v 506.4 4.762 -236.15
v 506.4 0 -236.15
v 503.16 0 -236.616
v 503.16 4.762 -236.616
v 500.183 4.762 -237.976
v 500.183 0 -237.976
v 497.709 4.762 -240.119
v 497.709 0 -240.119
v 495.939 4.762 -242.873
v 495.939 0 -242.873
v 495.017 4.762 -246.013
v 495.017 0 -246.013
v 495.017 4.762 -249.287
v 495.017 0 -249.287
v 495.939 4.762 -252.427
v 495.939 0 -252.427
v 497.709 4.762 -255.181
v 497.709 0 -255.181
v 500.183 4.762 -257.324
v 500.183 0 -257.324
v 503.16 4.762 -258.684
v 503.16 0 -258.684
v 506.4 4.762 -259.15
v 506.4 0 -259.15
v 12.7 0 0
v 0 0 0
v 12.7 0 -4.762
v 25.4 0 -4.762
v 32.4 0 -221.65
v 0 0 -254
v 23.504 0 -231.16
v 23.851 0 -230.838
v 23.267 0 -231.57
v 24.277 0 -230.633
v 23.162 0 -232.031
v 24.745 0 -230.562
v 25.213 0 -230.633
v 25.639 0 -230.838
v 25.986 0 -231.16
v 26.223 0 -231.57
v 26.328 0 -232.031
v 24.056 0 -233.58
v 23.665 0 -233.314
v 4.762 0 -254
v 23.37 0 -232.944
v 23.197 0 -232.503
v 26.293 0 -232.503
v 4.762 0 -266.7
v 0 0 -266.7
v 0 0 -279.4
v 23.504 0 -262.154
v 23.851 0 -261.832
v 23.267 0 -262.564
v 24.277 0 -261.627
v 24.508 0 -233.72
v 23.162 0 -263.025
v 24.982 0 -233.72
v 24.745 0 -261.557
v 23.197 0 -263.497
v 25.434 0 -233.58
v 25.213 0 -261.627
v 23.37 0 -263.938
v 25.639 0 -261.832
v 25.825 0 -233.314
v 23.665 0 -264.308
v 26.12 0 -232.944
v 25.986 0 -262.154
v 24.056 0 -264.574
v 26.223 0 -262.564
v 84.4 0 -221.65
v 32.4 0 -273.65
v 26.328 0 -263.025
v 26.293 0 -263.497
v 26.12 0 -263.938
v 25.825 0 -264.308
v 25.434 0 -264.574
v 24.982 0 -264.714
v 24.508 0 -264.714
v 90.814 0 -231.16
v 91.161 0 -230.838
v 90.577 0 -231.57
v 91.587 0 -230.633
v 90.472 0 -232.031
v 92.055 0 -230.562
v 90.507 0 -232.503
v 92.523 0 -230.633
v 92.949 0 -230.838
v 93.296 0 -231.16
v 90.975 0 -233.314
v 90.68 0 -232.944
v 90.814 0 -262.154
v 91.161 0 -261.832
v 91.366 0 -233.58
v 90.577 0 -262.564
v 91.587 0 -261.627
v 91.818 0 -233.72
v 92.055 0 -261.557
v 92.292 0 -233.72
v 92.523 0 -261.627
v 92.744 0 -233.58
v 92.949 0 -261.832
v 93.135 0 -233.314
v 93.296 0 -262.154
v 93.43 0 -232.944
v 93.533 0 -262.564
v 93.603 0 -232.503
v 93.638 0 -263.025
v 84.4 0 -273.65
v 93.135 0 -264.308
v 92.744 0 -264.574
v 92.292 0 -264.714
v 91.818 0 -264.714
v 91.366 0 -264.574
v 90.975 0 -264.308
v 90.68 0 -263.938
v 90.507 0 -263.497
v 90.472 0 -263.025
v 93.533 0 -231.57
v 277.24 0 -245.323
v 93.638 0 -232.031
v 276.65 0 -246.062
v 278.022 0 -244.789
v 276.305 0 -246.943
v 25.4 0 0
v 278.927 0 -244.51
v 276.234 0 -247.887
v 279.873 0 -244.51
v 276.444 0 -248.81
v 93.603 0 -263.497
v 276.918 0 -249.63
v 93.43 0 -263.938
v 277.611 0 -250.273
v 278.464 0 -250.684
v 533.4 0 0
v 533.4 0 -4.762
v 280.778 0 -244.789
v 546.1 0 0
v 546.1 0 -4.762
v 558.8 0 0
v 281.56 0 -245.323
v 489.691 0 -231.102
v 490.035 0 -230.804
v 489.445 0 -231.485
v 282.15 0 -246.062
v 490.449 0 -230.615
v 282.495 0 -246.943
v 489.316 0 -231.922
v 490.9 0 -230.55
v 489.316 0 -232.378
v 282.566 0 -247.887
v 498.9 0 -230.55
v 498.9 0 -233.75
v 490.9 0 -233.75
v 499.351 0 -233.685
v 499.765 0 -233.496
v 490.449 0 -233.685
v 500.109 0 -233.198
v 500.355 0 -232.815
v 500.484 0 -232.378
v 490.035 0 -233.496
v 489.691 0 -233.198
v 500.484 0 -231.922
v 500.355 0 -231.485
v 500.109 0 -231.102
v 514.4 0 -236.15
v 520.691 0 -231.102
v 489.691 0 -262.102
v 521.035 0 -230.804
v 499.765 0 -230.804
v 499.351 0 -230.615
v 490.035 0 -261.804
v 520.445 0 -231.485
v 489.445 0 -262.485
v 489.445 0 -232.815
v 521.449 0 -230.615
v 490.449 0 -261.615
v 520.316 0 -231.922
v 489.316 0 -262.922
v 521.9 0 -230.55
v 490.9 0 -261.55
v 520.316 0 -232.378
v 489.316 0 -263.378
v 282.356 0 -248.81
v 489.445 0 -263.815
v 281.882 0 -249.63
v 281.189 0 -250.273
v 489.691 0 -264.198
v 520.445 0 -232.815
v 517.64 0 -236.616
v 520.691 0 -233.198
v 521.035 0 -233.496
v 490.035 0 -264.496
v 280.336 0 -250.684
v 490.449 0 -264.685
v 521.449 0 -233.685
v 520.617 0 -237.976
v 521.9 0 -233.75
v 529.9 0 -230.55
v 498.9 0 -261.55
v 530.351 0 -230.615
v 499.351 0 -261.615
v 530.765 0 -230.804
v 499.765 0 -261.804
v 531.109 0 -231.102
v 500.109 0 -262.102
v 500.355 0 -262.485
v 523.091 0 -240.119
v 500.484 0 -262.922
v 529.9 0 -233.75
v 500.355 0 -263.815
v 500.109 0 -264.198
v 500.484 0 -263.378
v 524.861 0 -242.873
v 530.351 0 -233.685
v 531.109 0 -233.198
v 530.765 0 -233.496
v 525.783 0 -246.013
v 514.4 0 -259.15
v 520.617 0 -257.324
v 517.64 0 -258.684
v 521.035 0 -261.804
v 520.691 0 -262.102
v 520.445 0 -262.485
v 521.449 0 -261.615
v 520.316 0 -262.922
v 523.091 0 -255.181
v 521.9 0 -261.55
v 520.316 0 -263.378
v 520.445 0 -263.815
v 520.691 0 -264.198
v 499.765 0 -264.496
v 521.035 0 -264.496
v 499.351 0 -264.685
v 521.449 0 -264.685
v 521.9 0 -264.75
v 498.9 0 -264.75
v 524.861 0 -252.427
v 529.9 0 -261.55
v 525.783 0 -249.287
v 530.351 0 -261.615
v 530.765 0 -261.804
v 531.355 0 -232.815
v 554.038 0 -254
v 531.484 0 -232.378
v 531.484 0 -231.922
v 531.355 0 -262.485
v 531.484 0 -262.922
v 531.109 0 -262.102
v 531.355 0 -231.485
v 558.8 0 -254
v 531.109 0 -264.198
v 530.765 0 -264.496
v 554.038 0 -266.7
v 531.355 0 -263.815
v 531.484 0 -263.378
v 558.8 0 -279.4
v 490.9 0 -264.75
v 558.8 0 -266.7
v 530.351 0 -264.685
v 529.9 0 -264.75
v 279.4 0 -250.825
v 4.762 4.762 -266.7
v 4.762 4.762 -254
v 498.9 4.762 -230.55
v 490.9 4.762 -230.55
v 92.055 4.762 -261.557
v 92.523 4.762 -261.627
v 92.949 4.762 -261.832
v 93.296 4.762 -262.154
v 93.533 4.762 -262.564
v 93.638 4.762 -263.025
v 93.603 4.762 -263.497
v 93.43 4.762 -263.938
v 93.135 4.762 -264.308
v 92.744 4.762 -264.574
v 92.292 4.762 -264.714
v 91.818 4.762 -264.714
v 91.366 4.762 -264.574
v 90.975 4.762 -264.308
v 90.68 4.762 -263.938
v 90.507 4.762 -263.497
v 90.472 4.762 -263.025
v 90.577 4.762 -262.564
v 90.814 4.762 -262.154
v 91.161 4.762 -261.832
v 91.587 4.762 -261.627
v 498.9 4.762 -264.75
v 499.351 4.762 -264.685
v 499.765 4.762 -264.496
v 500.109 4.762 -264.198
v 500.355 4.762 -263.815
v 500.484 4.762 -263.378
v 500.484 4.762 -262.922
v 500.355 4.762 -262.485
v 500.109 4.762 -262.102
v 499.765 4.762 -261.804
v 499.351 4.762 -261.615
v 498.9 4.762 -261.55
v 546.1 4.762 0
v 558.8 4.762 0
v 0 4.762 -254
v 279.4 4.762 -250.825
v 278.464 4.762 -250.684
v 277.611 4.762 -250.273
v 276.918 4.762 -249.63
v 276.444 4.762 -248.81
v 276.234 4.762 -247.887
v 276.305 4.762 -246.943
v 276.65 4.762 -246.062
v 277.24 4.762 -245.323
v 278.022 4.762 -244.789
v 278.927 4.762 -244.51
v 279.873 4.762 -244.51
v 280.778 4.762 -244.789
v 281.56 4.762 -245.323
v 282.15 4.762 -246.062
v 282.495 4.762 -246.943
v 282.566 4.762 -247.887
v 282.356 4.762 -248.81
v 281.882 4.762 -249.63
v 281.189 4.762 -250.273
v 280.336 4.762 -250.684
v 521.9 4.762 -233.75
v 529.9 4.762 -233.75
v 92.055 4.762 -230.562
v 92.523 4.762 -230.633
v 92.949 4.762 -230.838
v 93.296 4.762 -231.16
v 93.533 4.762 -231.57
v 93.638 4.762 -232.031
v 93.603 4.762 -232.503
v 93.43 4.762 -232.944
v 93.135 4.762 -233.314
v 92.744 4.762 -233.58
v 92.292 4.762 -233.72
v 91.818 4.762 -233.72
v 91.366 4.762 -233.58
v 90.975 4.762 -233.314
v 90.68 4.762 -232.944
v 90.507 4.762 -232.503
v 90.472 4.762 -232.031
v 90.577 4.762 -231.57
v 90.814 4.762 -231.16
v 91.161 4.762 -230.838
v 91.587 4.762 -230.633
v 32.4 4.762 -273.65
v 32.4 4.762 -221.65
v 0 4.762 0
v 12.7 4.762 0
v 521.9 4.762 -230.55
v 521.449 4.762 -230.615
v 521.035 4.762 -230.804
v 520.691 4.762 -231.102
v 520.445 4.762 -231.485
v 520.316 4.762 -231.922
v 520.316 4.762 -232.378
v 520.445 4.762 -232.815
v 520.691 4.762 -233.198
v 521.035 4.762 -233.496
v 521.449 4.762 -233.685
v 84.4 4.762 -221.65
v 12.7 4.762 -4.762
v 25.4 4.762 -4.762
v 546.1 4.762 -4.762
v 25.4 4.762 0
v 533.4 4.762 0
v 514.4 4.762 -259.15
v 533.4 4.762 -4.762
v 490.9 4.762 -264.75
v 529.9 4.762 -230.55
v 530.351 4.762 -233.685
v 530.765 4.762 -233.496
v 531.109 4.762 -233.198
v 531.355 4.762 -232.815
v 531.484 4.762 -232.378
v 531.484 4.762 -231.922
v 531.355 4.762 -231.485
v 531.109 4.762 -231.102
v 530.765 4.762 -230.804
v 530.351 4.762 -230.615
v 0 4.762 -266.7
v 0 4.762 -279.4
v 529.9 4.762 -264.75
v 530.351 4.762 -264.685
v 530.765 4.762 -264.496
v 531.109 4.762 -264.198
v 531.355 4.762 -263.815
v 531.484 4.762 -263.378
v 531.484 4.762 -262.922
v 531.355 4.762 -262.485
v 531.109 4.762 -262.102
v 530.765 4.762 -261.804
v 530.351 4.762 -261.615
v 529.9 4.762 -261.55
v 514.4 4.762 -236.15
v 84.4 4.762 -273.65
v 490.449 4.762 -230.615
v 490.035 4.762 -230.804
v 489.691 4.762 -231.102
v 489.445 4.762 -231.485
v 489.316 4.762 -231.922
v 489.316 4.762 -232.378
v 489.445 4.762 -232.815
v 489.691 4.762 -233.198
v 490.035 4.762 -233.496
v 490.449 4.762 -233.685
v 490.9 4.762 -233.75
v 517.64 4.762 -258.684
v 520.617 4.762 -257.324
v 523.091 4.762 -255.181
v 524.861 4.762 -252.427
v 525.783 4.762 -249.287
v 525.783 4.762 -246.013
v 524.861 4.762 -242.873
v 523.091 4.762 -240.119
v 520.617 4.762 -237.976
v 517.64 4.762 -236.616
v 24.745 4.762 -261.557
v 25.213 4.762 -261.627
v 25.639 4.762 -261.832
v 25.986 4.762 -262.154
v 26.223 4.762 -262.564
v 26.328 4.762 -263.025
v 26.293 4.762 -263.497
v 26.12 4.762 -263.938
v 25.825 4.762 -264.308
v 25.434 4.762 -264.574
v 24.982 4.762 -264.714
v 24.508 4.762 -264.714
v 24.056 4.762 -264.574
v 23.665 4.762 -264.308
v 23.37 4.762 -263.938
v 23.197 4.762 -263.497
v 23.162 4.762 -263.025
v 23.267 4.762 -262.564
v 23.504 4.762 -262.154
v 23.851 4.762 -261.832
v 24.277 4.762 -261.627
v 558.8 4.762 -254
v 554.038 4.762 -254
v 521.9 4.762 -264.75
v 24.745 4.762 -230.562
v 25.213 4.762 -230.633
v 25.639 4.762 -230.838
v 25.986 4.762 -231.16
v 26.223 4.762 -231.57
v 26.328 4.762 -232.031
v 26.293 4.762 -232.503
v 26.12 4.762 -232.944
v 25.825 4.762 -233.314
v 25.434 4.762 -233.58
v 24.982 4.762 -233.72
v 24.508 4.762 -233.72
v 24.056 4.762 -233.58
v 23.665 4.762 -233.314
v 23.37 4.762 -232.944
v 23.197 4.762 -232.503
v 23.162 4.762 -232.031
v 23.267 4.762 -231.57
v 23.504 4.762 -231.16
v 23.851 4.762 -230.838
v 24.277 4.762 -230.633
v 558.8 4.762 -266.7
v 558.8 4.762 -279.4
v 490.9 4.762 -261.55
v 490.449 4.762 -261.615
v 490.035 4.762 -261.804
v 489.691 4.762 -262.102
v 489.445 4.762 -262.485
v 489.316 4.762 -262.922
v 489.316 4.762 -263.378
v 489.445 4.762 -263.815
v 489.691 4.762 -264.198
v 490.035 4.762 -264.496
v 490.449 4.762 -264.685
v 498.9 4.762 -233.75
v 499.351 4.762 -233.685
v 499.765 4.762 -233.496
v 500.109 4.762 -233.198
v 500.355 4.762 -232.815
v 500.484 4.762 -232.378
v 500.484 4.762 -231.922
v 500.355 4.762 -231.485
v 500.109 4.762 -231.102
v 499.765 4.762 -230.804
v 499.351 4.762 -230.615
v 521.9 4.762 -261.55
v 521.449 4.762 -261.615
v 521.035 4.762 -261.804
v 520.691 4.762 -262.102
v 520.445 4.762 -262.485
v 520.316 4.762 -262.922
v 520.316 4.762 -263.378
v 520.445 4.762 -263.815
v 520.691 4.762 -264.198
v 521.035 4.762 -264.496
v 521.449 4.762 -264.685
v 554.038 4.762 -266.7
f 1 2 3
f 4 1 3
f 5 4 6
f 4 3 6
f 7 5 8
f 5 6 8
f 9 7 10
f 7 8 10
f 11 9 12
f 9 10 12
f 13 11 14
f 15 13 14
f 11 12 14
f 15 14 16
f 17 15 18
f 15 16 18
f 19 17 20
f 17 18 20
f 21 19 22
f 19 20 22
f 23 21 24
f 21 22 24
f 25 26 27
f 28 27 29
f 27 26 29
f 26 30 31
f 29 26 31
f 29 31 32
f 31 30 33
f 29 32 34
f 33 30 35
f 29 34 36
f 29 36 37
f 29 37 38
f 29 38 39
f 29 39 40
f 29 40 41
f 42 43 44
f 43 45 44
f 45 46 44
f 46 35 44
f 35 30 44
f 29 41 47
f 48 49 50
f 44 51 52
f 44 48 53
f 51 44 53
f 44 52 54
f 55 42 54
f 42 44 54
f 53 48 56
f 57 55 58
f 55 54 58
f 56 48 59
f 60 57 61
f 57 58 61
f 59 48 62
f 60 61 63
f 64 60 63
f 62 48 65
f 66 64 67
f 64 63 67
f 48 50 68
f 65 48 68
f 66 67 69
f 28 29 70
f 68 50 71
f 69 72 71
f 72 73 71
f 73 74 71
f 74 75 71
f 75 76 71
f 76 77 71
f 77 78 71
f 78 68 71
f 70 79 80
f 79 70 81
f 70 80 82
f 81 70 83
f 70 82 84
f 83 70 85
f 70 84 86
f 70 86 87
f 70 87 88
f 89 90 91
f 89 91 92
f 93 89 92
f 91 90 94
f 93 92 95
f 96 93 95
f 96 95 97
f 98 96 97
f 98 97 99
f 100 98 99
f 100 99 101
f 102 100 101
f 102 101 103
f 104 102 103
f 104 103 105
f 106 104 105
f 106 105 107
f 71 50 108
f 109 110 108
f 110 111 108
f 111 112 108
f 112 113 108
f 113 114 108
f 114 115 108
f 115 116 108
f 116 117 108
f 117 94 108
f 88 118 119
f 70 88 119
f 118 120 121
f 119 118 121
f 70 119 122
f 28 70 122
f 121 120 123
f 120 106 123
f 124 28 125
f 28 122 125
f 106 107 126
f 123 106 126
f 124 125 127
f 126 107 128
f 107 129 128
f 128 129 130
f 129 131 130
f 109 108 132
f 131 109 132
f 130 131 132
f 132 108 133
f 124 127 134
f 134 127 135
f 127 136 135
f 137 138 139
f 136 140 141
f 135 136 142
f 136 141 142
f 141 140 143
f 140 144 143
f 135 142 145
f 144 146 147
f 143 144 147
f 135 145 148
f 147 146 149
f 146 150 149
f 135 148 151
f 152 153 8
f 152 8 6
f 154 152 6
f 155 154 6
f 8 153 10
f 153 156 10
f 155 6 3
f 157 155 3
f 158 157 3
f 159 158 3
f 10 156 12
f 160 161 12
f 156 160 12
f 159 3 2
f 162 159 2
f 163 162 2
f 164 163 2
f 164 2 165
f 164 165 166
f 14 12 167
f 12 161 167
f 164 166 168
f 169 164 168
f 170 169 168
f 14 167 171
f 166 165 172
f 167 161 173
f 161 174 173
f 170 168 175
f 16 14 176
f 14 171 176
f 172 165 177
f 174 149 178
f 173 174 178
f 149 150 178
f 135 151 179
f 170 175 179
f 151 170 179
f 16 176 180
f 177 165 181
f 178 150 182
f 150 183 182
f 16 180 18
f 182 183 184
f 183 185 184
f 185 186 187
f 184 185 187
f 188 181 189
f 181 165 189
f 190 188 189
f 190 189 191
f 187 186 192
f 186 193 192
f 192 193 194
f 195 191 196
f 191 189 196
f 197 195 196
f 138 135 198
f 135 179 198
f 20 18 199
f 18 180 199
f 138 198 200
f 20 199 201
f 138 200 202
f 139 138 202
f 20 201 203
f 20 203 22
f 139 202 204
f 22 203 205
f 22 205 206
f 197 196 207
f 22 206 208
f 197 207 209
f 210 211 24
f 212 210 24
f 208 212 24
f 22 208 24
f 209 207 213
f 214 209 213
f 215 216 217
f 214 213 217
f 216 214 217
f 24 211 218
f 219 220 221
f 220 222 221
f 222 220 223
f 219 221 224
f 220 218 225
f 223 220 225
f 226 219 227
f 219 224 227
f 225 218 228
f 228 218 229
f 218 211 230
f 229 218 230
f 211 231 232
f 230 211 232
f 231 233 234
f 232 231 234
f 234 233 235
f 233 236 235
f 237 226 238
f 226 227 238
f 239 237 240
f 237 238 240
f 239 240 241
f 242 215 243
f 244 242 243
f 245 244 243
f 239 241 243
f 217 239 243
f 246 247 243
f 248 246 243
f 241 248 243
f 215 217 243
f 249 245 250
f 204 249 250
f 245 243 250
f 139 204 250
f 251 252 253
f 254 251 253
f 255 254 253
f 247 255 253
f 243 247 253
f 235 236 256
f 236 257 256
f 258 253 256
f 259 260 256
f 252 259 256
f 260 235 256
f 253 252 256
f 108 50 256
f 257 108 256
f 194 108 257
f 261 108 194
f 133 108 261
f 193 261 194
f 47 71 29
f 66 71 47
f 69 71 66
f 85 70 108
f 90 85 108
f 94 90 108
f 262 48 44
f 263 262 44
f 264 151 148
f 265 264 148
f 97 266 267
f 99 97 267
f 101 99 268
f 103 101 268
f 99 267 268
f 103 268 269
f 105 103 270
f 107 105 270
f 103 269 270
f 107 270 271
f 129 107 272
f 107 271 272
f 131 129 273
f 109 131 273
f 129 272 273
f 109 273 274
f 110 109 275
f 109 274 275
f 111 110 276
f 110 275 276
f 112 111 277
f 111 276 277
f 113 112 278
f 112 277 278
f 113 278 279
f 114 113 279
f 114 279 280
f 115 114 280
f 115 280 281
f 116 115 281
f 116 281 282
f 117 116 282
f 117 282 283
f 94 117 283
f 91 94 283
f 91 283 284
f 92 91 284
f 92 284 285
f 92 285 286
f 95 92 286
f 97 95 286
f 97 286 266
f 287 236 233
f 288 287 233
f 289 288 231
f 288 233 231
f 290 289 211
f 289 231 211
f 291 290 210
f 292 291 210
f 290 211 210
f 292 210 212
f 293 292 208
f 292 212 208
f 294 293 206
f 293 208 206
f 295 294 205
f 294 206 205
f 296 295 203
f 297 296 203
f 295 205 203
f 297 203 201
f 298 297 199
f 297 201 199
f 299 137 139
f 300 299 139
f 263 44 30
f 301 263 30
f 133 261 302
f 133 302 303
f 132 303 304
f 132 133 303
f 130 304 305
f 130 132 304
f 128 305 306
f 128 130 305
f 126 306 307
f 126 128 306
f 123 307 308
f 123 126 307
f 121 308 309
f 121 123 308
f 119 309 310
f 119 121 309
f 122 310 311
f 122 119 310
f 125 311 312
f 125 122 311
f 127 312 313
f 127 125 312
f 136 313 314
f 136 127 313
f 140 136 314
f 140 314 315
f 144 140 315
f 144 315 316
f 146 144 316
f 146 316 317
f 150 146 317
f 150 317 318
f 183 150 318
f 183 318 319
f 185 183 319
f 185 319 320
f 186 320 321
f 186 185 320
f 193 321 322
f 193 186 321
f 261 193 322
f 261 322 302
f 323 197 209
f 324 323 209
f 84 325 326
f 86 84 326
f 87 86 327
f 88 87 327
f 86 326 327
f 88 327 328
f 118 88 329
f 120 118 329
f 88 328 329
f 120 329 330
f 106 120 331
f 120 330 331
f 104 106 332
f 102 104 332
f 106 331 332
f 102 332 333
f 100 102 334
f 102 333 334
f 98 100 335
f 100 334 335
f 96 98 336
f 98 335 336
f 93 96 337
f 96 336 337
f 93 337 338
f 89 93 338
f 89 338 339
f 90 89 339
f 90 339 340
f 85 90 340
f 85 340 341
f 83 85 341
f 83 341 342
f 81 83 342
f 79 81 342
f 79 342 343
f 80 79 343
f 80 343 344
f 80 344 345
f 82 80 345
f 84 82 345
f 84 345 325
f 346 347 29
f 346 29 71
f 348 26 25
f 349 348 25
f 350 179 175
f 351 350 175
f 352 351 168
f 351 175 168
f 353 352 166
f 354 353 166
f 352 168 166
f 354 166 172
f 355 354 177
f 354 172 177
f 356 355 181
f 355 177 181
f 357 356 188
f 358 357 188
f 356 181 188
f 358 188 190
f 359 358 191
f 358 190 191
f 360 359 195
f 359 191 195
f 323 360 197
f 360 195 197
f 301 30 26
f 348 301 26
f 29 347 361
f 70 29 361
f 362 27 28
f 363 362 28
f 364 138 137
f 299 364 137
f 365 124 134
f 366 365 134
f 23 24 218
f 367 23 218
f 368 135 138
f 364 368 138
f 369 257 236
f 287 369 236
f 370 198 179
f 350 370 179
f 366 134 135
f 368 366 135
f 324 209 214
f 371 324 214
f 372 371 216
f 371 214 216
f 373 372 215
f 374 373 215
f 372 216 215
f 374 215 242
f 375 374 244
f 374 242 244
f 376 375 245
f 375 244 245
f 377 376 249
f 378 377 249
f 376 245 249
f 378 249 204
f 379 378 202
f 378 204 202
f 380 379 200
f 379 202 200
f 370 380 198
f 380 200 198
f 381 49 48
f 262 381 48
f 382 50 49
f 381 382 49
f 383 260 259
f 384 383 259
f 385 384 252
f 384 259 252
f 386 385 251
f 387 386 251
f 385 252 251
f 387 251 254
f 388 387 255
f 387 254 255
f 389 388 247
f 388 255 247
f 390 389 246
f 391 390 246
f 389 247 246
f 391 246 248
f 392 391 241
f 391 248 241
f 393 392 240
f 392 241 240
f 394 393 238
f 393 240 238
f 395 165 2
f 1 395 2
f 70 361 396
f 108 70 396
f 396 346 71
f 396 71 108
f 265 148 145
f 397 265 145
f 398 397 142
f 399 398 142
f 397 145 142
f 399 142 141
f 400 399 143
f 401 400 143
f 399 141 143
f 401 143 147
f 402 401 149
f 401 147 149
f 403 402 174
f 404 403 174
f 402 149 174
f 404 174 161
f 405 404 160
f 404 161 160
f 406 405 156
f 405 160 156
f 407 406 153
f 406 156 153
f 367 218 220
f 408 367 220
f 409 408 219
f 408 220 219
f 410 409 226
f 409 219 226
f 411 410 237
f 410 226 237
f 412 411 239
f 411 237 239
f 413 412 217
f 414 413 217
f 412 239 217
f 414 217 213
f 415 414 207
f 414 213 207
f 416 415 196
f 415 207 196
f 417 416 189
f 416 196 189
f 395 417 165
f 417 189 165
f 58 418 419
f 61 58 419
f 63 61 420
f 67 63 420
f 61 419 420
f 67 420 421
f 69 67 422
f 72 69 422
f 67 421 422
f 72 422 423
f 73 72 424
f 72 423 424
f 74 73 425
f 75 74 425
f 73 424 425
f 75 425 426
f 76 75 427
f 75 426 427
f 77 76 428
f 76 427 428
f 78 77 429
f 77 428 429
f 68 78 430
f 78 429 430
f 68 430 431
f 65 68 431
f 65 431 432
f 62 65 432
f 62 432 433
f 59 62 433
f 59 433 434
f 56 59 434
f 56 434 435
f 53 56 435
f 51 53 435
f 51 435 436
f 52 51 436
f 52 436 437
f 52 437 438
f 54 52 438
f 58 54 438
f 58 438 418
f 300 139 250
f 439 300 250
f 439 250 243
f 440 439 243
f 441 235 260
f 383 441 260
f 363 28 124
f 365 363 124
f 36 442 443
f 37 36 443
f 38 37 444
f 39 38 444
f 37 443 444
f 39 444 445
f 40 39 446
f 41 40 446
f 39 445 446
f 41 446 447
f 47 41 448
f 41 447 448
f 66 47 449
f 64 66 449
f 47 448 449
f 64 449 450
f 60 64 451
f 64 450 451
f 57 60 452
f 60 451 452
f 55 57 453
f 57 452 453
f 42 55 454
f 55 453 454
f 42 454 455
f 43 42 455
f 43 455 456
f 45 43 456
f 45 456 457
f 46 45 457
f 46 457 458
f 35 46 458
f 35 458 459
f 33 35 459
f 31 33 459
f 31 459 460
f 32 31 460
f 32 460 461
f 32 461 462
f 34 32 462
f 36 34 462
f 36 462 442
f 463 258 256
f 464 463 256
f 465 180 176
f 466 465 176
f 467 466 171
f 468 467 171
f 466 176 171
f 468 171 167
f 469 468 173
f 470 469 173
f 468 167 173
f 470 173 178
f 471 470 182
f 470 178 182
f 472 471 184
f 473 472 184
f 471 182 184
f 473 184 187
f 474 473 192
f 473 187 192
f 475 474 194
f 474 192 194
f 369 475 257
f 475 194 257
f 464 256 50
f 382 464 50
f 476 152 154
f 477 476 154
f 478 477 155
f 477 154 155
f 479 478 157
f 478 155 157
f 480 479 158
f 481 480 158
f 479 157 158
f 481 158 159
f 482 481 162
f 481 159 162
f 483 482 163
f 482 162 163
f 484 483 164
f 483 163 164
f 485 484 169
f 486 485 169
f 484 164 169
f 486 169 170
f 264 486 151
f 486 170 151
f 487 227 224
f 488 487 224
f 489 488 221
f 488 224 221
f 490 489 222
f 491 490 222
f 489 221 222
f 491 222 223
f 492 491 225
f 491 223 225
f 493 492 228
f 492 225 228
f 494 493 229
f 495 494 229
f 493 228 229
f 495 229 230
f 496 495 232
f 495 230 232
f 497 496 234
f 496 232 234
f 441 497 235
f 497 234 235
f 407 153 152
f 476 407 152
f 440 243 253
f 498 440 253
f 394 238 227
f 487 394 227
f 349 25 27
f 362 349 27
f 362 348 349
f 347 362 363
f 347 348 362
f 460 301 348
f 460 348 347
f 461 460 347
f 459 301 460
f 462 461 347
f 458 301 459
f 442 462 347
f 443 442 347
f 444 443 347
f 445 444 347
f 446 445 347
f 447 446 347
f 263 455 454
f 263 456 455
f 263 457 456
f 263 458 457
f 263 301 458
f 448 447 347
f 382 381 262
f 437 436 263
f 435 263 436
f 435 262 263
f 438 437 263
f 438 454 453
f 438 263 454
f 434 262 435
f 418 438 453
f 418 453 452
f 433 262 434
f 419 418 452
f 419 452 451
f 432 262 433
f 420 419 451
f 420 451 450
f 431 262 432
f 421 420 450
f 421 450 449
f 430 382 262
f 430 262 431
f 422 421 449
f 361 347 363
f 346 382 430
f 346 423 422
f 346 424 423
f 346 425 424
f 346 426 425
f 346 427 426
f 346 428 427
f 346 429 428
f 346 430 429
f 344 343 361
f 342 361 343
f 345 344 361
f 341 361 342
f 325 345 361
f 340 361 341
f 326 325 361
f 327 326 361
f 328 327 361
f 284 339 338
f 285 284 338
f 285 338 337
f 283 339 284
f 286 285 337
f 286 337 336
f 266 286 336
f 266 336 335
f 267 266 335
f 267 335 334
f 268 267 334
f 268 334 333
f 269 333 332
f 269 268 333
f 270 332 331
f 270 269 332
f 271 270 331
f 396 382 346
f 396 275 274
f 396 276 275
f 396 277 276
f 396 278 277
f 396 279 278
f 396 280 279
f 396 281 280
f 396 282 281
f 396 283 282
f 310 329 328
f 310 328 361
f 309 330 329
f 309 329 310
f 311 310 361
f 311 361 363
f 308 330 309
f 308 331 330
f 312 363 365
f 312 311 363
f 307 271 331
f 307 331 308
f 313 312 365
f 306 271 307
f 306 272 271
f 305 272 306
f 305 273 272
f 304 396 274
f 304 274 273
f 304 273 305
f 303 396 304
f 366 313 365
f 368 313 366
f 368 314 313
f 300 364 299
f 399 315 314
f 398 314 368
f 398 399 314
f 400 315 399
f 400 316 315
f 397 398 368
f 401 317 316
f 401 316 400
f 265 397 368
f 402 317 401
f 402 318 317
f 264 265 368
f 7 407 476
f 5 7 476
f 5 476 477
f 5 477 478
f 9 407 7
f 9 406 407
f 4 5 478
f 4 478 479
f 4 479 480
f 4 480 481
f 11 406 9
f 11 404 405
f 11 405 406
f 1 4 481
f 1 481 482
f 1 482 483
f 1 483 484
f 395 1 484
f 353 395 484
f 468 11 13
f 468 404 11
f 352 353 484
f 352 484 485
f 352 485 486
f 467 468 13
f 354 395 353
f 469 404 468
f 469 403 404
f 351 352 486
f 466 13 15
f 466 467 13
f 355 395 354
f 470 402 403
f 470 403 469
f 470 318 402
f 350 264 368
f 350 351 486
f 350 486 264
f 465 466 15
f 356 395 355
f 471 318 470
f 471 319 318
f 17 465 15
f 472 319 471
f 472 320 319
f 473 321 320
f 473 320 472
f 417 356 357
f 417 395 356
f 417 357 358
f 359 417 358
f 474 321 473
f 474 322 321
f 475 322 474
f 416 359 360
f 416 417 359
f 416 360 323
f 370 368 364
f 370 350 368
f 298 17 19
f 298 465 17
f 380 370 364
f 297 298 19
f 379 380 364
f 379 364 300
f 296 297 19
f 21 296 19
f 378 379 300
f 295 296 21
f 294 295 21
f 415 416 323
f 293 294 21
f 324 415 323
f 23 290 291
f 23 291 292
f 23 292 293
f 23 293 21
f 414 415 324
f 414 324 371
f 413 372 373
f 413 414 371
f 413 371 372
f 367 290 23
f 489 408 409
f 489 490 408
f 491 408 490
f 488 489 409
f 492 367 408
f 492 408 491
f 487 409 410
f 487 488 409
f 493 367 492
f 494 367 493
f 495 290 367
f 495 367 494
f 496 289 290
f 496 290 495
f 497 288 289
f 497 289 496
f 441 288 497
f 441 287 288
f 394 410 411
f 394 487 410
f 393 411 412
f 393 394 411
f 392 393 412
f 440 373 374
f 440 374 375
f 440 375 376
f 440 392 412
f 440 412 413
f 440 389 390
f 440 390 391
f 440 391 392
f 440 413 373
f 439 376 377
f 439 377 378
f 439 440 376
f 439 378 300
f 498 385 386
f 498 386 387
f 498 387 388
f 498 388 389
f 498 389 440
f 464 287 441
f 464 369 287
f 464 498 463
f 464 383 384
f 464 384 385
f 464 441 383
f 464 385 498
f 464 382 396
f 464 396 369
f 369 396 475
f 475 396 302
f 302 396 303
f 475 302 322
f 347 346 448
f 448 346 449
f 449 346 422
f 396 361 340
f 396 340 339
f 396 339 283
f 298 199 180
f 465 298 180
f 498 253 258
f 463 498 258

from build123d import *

# Parameters (mm, degrees)
SKETCH1_R           = 3.175
BOSS_EXTRUDE1_DEPTH = 4.7625
SKETCH5_R           = 1.5875
SKETCH5_W           = 51.999999886
SKETCH5_H           = 51.999999886
CUT_EXTRUDE2_DEPTH  = 625.775544821


with BuildPart() as part:
    # Sketch1 → Boss-Extrude1 (new body)
    with BuildSketch(Plane(origin=(0, 0, 0), x_dir=(1, 0, 0), z_dir=(0, 1, 0))):
        Polygon((0, 0), (12.7, 0), (12.7, 4.7625), (25.4, 4.7625), (25.4, 0), (533.4, 0), (533.4, 4.7625), (546.1, 4.7625), (546.1, 0), (558.8, 0), (558.8, 254), (554.0375, 254), (554.0375, 266.7), (558.8, 266.7), (558.8, 279.4), (0, 279.4), (0, 266.7), (4.7625, 266.7), (4.7625, 254), (0, 254), align=None)
        with Locations(Location((279.4, 247.65, 0), (0, 0, 90))):
            Circle(SKETCH1_R, mode=Mode.SUBTRACT)
        with BuildLine():
            Line((38.9, 264.75), (46.9, 264.75))
            ThreePointArc((46.9, 264.75), (48.5, 263.15), (46.9, 261.55))
            Line((46.9, 261.55), (38.9, 261.55))
            ThreePointArc((38.9, 261.55), (37.3, 263.15), (38.9, 264.75))
        make_face(mode=Mode.SUBTRACT)
        with BuildLine():
            Line((69.9, 264.75), (77.9, 264.75))
            ThreePointArc((77.9, 264.75), (79.5, 263.15), (77.9, 261.55))
            Line((77.9, 261.55), (69.9, 261.55))
            ThreePointArc((69.9, 261.55), (68.3, 263.15), (69.9, 264.75))
        make_face(mode=Mode.SUBTRACT)
        with BuildLine():
            Line((38.9, 233.75), (46.9, 233.75))
            ThreePointArc((46.9, 233.75), (48.5, 232.15), (46.9, 230.55))
            Line((46.9, 230.55), (38.9, 230.55))
            ThreePointArc((38.9, 230.55), (37.3, 232.15), (38.9, 233.75))
        make_face(mode=Mode.SUBTRACT)
        with BuildLine():
            Line((69.9, 233.75), (77.9, 233.75))
            ThreePointArc((77.9, 233.75), (79.5, 232.15), (77.9, 230.55))
            Line((77.9, 230.55), (69.9, 230.55))
            ThreePointArc((69.9, 230.55), (68.3, 232.15), (69.9, 233.75))
        make_face(mode=Mode.SUBTRACT)
        with BuildLine():
            Line((490.9, 264.75), (498.9, 264.75))
            ThreePointArc((498.9, 264.75), (500.5, 263.15), (498.9, 261.55))
            Line((498.9, 261.55), (490.9, 261.55))
            ThreePointArc((490.9, 261.55), (489.3, 263.15), (490.9, 264.75))
        make_face(mode=Mode.SUBTRACT)
        with BuildLine():
            Line((490.9, 233.75), (498.9, 233.75))
            ThreePointArc((498.9, 233.75), (500.5, 232.15), (498.9, 230.55))
            Line((498.9, 230.55), (490.9, 230.55))
            ThreePointArc((490.9, 230.55), (489.3, 232.15), (490.9, 233.75))
        make_face(mode=Mode.SUBTRACT)
        with BuildLine():
            Line((521.9, 233.75), (529.9, 233.75))
            ThreePointArc((529.9, 233.75), (531.5, 232.15), (529.9, 230.55))
            Line((529.9, 230.55), (521.9, 230.55))
            ThreePointArc((521.9, 230.55), (520.3, 232.15), (521.9, 233.75))
        make_face(mode=Mode.SUBTRACT)
        with BuildLine():
            Line((529.9, 261.55), (521.9, 261.55))
            ThreePointArc((521.9, 261.55), (520.3, 263.15), (521.9, 264.75))
            Line((521.9, 264.75), (529.9, 264.75))
            ThreePointArc((529.9, 264.75), (531.5, 263.15), (529.9, 261.55))
        make_face(mode=Mode.SUBTRACT)
        with BuildLine():
            Line((54.4, 259.15), (62.4, 259.15))
            ThreePointArc((62.4, 259.15), (73.9, 247.65), (62.4, 236.15))
            Line((62.4, 236.15), (54.4, 236.15))
            ThreePointArc((54.4, 236.15), (42.9, 247.65), (54.4, 259.15))
        make_face(mode=Mode.SUBTRACT)
        with BuildLine():
            Line((506.4, 259.15), (514.4, 259.15))
            ThreePointArc((514.4, 259.15), (525.9, 247.65), (514.4, 236.15))
            Line((514.4, 236.15), (506.4, 236.15))
            ThreePointArc((506.4, 236.15), (494.9, 247.65), (506.4, 259.15))
        make_face(mode=Mode.SUBTRACT)
    extrude(amount=BOSS_EXTRUDE1_DEPTH)

    # Sketch5 → Cut-Extrude2 (cut, through all)
    with BuildSketch(Plane(origin=(0, 4.7625, 0), x_dir=(1, 0, 0), z_dir=(0, 1, 0))):
        with Locations(Location((24.745, 263.144, 0), (0, 0, 270))):
            Circle(SKETCH5_R)
        with Locations(Location((24.745, 232.15, 0), (0, 0, 270))):
            Circle(SKETCH5_R)
        with Locations(Location((92.055, 263.144, 0), (0, 0, 270))):
            Circle(SKETCH5_R)
        with Locations(Location((92.055, 232.15, 0), (0, 0, 270))):
            Circle(SKETCH5_R)
        with Locations((58.4, 247.65)):
            Rectangle(SKETCH5_W, SKETCH5_H)
    extrude(amount=-CUT_EXTRUDE2_DEPTH, mode=Mode.SUBTRACT)


solid = part.part
